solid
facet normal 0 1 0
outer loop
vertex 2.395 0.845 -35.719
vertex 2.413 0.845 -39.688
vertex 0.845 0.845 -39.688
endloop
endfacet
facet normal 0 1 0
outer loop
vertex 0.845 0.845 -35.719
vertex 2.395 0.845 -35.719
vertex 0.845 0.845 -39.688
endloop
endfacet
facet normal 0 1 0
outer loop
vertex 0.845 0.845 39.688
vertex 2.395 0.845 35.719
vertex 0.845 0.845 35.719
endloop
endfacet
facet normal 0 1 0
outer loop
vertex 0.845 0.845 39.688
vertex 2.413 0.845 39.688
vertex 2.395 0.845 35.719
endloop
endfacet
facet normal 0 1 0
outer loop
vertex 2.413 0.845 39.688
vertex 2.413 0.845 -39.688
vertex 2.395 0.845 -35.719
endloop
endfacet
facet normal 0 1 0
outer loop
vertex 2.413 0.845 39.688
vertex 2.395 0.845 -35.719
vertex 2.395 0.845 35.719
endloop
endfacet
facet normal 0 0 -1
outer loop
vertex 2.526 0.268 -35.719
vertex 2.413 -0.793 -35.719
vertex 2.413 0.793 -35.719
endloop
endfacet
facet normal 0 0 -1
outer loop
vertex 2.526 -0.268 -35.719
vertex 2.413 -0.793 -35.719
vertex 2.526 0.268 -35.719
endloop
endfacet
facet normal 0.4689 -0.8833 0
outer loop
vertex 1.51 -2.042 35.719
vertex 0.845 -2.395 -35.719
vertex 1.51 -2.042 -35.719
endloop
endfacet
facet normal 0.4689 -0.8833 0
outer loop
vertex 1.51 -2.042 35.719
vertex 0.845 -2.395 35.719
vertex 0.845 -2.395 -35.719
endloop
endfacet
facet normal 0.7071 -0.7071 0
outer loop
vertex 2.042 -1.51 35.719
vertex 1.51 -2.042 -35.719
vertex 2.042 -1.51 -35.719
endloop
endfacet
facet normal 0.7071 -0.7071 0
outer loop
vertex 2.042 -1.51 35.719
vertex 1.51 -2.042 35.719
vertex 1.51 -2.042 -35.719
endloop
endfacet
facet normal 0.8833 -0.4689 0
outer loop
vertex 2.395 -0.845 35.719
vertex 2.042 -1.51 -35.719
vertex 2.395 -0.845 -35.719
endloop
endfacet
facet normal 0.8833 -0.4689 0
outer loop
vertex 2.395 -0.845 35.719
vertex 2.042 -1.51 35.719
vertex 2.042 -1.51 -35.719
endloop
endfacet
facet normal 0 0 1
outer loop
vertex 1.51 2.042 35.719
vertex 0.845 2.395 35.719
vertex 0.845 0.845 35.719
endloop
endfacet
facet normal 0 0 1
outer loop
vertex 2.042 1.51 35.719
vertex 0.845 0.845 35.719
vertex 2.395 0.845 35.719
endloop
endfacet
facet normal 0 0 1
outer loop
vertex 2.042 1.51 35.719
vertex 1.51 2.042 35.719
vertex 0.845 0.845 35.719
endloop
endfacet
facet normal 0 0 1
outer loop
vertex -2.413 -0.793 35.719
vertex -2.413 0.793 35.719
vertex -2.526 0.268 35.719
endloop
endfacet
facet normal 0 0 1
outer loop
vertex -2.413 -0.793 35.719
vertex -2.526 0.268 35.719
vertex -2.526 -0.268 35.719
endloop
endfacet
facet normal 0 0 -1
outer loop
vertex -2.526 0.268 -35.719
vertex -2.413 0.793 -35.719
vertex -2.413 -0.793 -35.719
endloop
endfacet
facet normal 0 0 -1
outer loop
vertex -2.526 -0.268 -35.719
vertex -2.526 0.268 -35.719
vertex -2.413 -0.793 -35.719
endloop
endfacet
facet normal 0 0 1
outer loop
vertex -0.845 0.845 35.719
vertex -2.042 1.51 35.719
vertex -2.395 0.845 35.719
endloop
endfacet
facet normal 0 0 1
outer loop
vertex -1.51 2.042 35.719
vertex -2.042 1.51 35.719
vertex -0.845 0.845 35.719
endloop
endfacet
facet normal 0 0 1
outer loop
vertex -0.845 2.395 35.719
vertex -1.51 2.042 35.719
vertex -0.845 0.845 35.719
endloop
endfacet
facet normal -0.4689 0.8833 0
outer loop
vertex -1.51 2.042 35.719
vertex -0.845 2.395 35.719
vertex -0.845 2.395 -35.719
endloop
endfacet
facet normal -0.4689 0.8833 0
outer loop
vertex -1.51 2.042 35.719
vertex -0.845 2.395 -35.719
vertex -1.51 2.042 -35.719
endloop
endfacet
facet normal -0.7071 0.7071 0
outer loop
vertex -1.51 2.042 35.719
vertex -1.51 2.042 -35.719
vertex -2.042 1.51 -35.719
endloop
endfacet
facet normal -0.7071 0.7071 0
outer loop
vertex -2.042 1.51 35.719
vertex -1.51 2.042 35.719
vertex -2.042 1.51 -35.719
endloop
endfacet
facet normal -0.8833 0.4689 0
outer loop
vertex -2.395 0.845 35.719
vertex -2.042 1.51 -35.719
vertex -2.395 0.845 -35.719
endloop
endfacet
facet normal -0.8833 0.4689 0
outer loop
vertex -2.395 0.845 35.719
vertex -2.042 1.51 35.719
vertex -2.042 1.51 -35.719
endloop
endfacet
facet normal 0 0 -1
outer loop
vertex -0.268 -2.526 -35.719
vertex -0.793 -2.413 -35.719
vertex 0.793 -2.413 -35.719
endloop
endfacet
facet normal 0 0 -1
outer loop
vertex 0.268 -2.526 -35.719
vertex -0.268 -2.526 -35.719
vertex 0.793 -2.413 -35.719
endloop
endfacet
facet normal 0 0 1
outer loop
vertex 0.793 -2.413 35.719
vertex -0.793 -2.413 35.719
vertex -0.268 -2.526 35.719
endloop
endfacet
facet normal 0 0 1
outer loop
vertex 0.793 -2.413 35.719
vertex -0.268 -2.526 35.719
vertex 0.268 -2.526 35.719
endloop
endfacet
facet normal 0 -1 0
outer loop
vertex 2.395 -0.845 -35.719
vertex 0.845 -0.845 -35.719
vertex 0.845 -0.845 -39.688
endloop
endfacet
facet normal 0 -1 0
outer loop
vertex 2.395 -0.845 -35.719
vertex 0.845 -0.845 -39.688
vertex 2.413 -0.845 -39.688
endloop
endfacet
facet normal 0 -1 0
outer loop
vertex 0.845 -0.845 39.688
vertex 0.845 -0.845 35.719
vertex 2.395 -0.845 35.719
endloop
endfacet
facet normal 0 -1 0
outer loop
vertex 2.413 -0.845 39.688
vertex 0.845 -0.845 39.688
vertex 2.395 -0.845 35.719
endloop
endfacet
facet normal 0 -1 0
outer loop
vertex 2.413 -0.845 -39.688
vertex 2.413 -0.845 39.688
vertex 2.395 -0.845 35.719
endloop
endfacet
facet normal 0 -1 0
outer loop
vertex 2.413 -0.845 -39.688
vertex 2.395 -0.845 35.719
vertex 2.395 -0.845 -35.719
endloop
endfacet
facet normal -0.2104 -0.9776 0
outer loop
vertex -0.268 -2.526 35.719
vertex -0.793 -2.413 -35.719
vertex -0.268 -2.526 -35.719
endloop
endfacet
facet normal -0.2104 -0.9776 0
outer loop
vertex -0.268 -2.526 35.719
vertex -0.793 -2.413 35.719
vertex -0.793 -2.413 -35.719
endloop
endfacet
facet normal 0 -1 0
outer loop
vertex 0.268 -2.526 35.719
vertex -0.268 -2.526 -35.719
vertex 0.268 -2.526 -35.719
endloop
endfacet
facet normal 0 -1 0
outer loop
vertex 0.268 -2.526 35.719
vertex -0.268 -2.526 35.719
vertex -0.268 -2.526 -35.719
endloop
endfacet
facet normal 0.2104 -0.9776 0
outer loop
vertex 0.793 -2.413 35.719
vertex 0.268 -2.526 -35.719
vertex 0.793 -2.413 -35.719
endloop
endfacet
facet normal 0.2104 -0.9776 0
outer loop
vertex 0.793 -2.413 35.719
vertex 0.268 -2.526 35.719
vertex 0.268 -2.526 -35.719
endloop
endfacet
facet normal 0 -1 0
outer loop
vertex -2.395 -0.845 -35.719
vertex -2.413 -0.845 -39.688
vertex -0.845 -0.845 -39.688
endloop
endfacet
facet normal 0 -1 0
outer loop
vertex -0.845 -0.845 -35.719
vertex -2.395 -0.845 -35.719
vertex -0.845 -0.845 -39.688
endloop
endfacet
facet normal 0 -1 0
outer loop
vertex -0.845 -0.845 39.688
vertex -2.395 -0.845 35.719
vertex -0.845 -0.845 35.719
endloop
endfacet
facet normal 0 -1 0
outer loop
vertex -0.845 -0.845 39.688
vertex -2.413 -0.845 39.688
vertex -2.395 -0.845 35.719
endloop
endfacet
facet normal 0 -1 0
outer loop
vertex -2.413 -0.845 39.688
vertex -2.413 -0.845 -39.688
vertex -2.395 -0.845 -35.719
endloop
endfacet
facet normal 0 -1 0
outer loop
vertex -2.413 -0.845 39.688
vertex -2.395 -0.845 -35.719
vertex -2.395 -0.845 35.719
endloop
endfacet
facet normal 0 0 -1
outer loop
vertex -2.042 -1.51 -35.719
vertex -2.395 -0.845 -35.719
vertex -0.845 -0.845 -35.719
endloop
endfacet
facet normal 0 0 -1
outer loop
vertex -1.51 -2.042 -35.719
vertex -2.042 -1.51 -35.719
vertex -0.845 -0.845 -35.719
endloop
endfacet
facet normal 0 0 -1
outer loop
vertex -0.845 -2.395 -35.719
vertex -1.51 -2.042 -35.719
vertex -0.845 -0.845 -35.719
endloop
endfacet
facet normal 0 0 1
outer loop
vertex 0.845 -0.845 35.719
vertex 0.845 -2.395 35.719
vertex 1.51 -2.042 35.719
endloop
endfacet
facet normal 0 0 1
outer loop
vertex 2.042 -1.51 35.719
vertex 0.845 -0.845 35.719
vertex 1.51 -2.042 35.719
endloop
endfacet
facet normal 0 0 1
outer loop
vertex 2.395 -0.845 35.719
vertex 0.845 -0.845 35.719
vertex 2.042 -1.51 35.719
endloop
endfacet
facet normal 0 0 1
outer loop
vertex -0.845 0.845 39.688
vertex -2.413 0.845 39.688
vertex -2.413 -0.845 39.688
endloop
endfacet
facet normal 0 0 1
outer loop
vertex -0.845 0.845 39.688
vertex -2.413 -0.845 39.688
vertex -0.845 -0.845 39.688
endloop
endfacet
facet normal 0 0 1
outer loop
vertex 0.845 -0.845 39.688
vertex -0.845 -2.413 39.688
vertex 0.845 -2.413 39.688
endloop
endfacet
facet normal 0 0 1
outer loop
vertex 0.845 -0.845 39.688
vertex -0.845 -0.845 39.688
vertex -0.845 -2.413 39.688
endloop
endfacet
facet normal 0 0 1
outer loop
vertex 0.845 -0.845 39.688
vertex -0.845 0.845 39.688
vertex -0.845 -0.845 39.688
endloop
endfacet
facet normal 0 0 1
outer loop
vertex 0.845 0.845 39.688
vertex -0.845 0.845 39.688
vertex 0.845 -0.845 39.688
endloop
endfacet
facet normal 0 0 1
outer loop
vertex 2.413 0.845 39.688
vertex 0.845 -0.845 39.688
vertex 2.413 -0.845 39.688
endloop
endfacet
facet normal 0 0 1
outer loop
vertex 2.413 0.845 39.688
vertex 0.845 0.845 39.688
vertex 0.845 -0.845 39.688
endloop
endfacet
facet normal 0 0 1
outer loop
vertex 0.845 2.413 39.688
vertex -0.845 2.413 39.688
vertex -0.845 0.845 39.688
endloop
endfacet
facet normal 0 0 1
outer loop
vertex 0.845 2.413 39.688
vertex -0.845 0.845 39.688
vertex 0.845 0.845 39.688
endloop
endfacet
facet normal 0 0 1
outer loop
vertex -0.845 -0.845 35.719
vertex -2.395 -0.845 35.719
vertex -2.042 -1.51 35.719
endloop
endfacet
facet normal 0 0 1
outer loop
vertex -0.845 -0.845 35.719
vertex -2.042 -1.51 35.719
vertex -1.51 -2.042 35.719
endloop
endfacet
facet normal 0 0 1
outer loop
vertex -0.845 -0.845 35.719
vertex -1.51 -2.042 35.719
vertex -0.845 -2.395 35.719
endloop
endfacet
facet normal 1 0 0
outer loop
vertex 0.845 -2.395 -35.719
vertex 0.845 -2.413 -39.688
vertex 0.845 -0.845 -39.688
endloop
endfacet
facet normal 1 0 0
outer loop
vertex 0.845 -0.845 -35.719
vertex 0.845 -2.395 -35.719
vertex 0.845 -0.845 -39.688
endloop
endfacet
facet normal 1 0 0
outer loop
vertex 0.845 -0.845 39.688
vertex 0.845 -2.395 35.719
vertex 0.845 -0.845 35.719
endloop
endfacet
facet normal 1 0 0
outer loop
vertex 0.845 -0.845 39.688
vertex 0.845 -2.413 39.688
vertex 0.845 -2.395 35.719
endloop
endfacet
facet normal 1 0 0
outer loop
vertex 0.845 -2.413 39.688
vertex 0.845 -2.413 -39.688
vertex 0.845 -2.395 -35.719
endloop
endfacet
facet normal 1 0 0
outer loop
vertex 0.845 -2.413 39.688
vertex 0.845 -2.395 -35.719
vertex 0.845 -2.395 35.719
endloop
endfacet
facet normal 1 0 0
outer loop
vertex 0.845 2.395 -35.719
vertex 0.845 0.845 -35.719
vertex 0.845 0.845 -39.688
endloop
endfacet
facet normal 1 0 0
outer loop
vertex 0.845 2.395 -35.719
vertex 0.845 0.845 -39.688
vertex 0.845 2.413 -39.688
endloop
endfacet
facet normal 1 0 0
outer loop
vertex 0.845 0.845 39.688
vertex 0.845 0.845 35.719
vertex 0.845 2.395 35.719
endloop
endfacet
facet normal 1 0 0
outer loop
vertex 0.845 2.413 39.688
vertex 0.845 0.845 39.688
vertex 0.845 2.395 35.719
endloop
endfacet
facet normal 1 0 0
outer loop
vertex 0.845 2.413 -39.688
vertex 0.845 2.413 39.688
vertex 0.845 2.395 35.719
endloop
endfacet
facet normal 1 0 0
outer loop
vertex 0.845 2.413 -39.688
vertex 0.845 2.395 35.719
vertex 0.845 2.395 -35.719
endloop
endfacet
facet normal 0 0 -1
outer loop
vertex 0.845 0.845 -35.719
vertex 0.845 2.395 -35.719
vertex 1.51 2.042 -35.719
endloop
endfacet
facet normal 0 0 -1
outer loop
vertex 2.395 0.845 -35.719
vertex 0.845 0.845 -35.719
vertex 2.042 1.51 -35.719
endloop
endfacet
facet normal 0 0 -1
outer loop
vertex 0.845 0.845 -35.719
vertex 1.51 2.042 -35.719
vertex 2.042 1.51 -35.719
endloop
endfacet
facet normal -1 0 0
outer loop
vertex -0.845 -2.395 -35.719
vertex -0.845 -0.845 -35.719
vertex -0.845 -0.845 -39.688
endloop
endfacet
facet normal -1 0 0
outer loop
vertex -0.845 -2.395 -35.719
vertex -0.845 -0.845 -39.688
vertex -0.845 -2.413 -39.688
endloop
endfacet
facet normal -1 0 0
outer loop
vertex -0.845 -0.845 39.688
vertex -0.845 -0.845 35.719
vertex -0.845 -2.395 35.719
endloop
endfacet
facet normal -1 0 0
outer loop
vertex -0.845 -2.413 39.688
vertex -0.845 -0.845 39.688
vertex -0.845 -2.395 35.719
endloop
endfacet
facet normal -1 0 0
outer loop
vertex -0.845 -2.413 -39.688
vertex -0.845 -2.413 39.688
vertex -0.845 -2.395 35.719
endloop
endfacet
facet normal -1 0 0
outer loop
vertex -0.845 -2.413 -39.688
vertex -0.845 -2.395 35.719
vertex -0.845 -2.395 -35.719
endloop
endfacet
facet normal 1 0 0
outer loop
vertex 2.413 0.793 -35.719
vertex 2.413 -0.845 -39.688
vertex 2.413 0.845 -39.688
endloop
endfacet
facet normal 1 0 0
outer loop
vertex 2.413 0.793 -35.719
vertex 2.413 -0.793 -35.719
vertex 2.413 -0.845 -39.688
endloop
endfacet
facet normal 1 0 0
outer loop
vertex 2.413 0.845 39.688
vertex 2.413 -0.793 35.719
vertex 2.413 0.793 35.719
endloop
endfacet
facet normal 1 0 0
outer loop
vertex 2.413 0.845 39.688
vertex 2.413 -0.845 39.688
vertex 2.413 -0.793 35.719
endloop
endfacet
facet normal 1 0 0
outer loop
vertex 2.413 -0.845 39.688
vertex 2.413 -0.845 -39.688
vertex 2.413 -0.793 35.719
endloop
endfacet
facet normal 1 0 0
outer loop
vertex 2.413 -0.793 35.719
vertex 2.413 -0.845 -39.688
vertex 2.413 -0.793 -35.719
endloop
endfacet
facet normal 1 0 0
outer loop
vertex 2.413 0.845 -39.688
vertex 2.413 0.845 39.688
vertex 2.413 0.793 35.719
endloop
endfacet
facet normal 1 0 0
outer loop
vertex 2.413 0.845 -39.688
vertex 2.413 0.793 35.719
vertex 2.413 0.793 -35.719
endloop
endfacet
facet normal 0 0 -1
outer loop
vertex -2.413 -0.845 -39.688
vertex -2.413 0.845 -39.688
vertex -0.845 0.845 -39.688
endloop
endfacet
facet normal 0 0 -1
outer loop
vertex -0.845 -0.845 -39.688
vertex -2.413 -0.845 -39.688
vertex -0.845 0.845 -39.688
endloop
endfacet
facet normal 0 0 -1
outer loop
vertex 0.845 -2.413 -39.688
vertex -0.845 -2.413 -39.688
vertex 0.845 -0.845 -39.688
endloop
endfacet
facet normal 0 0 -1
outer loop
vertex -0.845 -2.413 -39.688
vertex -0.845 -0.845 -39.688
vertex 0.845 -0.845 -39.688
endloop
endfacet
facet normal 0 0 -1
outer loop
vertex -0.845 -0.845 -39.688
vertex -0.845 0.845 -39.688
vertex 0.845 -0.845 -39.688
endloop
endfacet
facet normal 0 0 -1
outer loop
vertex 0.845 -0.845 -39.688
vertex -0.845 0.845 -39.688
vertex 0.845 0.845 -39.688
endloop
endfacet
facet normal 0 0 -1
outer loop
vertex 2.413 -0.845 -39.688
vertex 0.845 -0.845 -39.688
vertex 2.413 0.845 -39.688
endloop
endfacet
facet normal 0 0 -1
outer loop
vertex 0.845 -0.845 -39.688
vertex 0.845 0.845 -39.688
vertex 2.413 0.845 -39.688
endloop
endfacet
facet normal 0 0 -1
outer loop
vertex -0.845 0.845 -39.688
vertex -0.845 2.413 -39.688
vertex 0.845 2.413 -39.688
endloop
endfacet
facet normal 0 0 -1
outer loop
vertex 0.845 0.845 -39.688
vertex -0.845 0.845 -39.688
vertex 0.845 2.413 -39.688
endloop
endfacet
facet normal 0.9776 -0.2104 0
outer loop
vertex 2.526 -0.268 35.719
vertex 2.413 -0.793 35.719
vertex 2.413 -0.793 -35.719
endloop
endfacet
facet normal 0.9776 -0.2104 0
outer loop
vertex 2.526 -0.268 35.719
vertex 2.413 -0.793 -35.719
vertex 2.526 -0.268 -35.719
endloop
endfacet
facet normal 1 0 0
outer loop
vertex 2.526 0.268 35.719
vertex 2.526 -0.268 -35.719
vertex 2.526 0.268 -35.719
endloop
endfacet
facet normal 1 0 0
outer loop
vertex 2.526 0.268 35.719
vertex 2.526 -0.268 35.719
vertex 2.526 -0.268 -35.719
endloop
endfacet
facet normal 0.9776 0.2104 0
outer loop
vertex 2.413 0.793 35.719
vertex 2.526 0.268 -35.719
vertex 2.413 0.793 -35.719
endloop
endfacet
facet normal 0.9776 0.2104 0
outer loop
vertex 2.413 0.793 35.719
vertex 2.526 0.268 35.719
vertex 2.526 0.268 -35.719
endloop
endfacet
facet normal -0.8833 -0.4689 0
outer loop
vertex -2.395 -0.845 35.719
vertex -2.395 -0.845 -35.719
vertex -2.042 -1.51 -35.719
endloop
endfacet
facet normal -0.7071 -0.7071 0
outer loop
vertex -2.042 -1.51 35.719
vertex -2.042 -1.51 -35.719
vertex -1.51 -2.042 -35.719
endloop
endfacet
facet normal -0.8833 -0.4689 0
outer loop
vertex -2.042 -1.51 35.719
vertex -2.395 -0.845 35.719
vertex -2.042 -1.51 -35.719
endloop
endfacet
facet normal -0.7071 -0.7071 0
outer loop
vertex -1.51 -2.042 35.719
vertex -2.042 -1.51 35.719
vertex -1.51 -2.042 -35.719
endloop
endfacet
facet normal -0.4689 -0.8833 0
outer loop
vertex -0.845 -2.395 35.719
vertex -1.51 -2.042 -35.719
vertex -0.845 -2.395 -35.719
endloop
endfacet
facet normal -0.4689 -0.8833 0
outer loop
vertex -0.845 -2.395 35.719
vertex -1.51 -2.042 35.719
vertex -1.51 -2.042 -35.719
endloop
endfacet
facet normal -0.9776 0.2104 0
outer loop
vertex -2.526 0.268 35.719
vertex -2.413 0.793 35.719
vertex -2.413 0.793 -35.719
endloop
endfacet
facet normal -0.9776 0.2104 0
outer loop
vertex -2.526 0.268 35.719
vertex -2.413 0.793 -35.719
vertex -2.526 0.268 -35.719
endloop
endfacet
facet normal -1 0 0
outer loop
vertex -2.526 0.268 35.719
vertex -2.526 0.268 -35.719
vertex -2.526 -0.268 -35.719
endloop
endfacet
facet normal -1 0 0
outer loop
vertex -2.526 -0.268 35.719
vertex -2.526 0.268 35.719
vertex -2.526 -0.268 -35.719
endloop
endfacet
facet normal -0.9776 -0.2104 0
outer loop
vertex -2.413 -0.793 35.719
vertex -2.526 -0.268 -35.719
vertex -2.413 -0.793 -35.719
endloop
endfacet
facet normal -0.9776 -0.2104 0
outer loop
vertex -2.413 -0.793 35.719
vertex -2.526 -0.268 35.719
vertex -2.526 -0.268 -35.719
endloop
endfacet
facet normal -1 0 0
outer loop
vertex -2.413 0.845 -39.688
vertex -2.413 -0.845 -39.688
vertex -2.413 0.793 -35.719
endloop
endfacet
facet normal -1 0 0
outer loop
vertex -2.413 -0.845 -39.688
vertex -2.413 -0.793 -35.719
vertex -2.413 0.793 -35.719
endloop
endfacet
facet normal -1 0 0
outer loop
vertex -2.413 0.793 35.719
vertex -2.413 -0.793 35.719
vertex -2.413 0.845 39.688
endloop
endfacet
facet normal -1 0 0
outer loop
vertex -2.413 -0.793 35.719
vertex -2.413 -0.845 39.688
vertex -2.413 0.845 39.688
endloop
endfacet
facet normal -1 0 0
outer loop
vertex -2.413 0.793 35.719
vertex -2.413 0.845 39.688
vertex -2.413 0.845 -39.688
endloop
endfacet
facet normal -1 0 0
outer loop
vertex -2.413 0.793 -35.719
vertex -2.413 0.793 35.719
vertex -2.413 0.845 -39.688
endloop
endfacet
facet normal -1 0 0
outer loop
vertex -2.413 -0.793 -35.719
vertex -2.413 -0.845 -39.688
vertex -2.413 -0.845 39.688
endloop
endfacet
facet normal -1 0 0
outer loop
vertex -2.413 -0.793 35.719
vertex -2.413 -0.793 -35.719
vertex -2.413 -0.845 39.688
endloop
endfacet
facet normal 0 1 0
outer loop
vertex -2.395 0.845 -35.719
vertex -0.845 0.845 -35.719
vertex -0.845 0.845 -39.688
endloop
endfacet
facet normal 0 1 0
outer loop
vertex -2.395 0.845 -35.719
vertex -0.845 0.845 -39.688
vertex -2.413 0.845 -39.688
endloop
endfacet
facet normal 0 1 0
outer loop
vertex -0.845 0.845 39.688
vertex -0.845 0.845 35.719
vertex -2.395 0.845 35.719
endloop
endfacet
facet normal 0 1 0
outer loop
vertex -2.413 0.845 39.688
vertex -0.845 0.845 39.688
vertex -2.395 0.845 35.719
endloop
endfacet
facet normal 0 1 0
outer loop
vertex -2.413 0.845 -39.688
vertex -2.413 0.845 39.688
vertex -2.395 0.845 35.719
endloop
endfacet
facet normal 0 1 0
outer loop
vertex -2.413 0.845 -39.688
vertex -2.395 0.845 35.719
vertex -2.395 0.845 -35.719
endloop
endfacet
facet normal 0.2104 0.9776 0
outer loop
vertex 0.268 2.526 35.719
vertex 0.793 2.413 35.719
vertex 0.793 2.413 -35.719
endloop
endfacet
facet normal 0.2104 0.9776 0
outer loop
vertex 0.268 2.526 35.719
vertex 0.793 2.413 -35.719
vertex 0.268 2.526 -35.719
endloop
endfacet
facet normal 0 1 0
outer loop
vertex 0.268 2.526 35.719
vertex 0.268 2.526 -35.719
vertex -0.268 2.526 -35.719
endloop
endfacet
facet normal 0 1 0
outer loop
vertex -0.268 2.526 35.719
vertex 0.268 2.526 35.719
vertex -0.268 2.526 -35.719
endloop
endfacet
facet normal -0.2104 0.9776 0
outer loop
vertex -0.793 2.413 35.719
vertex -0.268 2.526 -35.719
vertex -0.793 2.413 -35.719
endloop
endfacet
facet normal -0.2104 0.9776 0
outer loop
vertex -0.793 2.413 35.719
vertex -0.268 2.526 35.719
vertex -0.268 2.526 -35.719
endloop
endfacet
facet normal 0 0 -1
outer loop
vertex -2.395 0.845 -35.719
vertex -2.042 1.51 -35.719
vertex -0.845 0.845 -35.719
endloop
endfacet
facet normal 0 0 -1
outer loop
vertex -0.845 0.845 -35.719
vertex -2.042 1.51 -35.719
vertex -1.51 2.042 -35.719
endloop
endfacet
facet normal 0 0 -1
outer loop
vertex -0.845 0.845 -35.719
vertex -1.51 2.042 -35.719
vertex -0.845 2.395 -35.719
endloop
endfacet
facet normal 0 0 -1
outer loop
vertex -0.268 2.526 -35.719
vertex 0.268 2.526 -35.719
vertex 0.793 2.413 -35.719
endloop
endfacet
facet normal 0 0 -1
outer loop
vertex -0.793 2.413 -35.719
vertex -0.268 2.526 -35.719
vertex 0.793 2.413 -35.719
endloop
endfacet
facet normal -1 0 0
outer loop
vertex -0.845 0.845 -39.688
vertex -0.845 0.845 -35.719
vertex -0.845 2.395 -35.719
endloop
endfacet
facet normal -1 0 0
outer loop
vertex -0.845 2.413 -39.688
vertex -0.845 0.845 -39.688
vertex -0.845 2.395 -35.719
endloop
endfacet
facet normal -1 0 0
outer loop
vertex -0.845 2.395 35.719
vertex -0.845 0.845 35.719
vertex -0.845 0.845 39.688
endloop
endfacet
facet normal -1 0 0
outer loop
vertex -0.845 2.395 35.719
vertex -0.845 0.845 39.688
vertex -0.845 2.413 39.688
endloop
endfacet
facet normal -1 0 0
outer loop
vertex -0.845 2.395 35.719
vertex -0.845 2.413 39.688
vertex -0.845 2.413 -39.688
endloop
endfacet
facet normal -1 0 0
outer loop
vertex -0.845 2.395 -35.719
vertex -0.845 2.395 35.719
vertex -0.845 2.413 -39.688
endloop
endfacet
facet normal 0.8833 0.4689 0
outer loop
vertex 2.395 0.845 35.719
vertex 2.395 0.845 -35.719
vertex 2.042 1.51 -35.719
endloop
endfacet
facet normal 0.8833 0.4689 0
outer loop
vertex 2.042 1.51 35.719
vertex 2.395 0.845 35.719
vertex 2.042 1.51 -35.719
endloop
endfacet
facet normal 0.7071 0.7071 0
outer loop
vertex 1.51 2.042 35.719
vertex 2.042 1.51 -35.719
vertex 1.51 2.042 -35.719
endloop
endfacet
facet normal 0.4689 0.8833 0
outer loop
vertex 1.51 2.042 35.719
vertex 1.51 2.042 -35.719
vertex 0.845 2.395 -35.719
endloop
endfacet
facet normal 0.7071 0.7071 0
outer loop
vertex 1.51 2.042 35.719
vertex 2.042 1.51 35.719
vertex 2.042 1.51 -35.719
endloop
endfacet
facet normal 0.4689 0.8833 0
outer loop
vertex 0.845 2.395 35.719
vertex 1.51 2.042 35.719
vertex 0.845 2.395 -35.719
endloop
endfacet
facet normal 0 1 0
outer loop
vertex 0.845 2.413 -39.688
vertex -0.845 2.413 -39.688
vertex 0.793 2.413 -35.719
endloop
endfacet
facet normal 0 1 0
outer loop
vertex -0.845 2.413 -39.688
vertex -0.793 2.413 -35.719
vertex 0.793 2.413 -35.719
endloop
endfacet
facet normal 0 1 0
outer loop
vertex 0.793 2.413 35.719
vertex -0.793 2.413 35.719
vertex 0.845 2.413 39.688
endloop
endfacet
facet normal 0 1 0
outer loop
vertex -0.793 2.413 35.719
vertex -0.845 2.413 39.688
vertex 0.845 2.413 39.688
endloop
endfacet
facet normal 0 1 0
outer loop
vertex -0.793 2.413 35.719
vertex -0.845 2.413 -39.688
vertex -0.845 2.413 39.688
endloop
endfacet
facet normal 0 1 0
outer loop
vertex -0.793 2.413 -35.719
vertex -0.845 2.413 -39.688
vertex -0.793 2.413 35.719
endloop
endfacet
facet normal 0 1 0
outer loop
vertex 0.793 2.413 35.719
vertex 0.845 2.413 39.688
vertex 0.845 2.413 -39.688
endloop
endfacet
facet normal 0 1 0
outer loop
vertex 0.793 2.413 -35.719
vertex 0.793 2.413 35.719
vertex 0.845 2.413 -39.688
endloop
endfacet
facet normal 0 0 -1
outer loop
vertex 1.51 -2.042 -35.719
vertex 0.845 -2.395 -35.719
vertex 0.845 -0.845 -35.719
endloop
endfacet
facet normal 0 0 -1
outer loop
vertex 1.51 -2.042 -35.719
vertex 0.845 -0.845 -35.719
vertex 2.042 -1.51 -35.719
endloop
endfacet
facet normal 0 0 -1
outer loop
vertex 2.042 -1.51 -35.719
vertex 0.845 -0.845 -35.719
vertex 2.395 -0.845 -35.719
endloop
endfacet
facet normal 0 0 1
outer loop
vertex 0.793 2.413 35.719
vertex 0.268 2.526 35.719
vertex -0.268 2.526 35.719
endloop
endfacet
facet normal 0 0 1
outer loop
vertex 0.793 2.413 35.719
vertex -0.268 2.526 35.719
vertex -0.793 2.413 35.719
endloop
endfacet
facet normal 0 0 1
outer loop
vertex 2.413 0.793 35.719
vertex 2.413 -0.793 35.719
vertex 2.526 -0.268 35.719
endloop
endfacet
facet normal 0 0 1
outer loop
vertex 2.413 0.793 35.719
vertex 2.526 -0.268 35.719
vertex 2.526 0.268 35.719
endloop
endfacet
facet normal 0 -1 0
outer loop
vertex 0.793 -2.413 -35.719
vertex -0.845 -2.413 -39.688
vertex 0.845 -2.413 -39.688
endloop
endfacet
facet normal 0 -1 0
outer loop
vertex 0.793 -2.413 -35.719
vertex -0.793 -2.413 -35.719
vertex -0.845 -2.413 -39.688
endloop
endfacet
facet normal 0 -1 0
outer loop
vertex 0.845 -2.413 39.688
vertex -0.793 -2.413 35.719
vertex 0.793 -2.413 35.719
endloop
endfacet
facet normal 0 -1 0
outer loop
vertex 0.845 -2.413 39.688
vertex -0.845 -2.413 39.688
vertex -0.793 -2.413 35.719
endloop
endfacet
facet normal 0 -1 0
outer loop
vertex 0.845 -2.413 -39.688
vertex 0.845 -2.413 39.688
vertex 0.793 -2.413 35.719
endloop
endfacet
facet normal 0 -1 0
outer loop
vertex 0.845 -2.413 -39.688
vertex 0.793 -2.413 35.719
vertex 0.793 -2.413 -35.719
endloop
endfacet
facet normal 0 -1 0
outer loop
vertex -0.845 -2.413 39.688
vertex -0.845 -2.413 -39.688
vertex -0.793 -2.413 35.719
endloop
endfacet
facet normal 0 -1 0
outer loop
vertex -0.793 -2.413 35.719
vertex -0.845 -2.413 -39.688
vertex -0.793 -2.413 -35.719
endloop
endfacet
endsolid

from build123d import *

# Parameters (mm, degrees)
F0_W     = 1.6891
F0_H     = 1.56845
F0_H_2   = 1.6891
F0_W_2   = 1.56845
F1_DEPTH = 39.6875
F2_R     = 2.54
F3_DEPTH = 35.71875


with BuildPart() as f1:
    # F0 (on Top) → F1 (new body, symmetric)
    with BuildSketch(Plane.XY):
        with Locations((0, -1.628775)):
            Rectangle(F0_W, F0_H)
        Rectangle(F0_W, F0_H_2)
        with Locations((1.628775, 0)):
            Rectangle(F0_W_2, F0_H_2)
        with Locations((-1.628775, 0)):
            Rectangle(F0_W_2, F0_H_2)
        with Locations((0, 1.628775)):
            Rectangle(F0_W, F0_H)
    extrude(amount=F1_DEPTH, both=True)

    # F2 (on Top) → F3 (join, symmetric)
    with BuildSketch(Plane.XY):
        Circle(F2_R)
    extrude(amount=F3_DEPTH, both=True)


solid = f1.part
